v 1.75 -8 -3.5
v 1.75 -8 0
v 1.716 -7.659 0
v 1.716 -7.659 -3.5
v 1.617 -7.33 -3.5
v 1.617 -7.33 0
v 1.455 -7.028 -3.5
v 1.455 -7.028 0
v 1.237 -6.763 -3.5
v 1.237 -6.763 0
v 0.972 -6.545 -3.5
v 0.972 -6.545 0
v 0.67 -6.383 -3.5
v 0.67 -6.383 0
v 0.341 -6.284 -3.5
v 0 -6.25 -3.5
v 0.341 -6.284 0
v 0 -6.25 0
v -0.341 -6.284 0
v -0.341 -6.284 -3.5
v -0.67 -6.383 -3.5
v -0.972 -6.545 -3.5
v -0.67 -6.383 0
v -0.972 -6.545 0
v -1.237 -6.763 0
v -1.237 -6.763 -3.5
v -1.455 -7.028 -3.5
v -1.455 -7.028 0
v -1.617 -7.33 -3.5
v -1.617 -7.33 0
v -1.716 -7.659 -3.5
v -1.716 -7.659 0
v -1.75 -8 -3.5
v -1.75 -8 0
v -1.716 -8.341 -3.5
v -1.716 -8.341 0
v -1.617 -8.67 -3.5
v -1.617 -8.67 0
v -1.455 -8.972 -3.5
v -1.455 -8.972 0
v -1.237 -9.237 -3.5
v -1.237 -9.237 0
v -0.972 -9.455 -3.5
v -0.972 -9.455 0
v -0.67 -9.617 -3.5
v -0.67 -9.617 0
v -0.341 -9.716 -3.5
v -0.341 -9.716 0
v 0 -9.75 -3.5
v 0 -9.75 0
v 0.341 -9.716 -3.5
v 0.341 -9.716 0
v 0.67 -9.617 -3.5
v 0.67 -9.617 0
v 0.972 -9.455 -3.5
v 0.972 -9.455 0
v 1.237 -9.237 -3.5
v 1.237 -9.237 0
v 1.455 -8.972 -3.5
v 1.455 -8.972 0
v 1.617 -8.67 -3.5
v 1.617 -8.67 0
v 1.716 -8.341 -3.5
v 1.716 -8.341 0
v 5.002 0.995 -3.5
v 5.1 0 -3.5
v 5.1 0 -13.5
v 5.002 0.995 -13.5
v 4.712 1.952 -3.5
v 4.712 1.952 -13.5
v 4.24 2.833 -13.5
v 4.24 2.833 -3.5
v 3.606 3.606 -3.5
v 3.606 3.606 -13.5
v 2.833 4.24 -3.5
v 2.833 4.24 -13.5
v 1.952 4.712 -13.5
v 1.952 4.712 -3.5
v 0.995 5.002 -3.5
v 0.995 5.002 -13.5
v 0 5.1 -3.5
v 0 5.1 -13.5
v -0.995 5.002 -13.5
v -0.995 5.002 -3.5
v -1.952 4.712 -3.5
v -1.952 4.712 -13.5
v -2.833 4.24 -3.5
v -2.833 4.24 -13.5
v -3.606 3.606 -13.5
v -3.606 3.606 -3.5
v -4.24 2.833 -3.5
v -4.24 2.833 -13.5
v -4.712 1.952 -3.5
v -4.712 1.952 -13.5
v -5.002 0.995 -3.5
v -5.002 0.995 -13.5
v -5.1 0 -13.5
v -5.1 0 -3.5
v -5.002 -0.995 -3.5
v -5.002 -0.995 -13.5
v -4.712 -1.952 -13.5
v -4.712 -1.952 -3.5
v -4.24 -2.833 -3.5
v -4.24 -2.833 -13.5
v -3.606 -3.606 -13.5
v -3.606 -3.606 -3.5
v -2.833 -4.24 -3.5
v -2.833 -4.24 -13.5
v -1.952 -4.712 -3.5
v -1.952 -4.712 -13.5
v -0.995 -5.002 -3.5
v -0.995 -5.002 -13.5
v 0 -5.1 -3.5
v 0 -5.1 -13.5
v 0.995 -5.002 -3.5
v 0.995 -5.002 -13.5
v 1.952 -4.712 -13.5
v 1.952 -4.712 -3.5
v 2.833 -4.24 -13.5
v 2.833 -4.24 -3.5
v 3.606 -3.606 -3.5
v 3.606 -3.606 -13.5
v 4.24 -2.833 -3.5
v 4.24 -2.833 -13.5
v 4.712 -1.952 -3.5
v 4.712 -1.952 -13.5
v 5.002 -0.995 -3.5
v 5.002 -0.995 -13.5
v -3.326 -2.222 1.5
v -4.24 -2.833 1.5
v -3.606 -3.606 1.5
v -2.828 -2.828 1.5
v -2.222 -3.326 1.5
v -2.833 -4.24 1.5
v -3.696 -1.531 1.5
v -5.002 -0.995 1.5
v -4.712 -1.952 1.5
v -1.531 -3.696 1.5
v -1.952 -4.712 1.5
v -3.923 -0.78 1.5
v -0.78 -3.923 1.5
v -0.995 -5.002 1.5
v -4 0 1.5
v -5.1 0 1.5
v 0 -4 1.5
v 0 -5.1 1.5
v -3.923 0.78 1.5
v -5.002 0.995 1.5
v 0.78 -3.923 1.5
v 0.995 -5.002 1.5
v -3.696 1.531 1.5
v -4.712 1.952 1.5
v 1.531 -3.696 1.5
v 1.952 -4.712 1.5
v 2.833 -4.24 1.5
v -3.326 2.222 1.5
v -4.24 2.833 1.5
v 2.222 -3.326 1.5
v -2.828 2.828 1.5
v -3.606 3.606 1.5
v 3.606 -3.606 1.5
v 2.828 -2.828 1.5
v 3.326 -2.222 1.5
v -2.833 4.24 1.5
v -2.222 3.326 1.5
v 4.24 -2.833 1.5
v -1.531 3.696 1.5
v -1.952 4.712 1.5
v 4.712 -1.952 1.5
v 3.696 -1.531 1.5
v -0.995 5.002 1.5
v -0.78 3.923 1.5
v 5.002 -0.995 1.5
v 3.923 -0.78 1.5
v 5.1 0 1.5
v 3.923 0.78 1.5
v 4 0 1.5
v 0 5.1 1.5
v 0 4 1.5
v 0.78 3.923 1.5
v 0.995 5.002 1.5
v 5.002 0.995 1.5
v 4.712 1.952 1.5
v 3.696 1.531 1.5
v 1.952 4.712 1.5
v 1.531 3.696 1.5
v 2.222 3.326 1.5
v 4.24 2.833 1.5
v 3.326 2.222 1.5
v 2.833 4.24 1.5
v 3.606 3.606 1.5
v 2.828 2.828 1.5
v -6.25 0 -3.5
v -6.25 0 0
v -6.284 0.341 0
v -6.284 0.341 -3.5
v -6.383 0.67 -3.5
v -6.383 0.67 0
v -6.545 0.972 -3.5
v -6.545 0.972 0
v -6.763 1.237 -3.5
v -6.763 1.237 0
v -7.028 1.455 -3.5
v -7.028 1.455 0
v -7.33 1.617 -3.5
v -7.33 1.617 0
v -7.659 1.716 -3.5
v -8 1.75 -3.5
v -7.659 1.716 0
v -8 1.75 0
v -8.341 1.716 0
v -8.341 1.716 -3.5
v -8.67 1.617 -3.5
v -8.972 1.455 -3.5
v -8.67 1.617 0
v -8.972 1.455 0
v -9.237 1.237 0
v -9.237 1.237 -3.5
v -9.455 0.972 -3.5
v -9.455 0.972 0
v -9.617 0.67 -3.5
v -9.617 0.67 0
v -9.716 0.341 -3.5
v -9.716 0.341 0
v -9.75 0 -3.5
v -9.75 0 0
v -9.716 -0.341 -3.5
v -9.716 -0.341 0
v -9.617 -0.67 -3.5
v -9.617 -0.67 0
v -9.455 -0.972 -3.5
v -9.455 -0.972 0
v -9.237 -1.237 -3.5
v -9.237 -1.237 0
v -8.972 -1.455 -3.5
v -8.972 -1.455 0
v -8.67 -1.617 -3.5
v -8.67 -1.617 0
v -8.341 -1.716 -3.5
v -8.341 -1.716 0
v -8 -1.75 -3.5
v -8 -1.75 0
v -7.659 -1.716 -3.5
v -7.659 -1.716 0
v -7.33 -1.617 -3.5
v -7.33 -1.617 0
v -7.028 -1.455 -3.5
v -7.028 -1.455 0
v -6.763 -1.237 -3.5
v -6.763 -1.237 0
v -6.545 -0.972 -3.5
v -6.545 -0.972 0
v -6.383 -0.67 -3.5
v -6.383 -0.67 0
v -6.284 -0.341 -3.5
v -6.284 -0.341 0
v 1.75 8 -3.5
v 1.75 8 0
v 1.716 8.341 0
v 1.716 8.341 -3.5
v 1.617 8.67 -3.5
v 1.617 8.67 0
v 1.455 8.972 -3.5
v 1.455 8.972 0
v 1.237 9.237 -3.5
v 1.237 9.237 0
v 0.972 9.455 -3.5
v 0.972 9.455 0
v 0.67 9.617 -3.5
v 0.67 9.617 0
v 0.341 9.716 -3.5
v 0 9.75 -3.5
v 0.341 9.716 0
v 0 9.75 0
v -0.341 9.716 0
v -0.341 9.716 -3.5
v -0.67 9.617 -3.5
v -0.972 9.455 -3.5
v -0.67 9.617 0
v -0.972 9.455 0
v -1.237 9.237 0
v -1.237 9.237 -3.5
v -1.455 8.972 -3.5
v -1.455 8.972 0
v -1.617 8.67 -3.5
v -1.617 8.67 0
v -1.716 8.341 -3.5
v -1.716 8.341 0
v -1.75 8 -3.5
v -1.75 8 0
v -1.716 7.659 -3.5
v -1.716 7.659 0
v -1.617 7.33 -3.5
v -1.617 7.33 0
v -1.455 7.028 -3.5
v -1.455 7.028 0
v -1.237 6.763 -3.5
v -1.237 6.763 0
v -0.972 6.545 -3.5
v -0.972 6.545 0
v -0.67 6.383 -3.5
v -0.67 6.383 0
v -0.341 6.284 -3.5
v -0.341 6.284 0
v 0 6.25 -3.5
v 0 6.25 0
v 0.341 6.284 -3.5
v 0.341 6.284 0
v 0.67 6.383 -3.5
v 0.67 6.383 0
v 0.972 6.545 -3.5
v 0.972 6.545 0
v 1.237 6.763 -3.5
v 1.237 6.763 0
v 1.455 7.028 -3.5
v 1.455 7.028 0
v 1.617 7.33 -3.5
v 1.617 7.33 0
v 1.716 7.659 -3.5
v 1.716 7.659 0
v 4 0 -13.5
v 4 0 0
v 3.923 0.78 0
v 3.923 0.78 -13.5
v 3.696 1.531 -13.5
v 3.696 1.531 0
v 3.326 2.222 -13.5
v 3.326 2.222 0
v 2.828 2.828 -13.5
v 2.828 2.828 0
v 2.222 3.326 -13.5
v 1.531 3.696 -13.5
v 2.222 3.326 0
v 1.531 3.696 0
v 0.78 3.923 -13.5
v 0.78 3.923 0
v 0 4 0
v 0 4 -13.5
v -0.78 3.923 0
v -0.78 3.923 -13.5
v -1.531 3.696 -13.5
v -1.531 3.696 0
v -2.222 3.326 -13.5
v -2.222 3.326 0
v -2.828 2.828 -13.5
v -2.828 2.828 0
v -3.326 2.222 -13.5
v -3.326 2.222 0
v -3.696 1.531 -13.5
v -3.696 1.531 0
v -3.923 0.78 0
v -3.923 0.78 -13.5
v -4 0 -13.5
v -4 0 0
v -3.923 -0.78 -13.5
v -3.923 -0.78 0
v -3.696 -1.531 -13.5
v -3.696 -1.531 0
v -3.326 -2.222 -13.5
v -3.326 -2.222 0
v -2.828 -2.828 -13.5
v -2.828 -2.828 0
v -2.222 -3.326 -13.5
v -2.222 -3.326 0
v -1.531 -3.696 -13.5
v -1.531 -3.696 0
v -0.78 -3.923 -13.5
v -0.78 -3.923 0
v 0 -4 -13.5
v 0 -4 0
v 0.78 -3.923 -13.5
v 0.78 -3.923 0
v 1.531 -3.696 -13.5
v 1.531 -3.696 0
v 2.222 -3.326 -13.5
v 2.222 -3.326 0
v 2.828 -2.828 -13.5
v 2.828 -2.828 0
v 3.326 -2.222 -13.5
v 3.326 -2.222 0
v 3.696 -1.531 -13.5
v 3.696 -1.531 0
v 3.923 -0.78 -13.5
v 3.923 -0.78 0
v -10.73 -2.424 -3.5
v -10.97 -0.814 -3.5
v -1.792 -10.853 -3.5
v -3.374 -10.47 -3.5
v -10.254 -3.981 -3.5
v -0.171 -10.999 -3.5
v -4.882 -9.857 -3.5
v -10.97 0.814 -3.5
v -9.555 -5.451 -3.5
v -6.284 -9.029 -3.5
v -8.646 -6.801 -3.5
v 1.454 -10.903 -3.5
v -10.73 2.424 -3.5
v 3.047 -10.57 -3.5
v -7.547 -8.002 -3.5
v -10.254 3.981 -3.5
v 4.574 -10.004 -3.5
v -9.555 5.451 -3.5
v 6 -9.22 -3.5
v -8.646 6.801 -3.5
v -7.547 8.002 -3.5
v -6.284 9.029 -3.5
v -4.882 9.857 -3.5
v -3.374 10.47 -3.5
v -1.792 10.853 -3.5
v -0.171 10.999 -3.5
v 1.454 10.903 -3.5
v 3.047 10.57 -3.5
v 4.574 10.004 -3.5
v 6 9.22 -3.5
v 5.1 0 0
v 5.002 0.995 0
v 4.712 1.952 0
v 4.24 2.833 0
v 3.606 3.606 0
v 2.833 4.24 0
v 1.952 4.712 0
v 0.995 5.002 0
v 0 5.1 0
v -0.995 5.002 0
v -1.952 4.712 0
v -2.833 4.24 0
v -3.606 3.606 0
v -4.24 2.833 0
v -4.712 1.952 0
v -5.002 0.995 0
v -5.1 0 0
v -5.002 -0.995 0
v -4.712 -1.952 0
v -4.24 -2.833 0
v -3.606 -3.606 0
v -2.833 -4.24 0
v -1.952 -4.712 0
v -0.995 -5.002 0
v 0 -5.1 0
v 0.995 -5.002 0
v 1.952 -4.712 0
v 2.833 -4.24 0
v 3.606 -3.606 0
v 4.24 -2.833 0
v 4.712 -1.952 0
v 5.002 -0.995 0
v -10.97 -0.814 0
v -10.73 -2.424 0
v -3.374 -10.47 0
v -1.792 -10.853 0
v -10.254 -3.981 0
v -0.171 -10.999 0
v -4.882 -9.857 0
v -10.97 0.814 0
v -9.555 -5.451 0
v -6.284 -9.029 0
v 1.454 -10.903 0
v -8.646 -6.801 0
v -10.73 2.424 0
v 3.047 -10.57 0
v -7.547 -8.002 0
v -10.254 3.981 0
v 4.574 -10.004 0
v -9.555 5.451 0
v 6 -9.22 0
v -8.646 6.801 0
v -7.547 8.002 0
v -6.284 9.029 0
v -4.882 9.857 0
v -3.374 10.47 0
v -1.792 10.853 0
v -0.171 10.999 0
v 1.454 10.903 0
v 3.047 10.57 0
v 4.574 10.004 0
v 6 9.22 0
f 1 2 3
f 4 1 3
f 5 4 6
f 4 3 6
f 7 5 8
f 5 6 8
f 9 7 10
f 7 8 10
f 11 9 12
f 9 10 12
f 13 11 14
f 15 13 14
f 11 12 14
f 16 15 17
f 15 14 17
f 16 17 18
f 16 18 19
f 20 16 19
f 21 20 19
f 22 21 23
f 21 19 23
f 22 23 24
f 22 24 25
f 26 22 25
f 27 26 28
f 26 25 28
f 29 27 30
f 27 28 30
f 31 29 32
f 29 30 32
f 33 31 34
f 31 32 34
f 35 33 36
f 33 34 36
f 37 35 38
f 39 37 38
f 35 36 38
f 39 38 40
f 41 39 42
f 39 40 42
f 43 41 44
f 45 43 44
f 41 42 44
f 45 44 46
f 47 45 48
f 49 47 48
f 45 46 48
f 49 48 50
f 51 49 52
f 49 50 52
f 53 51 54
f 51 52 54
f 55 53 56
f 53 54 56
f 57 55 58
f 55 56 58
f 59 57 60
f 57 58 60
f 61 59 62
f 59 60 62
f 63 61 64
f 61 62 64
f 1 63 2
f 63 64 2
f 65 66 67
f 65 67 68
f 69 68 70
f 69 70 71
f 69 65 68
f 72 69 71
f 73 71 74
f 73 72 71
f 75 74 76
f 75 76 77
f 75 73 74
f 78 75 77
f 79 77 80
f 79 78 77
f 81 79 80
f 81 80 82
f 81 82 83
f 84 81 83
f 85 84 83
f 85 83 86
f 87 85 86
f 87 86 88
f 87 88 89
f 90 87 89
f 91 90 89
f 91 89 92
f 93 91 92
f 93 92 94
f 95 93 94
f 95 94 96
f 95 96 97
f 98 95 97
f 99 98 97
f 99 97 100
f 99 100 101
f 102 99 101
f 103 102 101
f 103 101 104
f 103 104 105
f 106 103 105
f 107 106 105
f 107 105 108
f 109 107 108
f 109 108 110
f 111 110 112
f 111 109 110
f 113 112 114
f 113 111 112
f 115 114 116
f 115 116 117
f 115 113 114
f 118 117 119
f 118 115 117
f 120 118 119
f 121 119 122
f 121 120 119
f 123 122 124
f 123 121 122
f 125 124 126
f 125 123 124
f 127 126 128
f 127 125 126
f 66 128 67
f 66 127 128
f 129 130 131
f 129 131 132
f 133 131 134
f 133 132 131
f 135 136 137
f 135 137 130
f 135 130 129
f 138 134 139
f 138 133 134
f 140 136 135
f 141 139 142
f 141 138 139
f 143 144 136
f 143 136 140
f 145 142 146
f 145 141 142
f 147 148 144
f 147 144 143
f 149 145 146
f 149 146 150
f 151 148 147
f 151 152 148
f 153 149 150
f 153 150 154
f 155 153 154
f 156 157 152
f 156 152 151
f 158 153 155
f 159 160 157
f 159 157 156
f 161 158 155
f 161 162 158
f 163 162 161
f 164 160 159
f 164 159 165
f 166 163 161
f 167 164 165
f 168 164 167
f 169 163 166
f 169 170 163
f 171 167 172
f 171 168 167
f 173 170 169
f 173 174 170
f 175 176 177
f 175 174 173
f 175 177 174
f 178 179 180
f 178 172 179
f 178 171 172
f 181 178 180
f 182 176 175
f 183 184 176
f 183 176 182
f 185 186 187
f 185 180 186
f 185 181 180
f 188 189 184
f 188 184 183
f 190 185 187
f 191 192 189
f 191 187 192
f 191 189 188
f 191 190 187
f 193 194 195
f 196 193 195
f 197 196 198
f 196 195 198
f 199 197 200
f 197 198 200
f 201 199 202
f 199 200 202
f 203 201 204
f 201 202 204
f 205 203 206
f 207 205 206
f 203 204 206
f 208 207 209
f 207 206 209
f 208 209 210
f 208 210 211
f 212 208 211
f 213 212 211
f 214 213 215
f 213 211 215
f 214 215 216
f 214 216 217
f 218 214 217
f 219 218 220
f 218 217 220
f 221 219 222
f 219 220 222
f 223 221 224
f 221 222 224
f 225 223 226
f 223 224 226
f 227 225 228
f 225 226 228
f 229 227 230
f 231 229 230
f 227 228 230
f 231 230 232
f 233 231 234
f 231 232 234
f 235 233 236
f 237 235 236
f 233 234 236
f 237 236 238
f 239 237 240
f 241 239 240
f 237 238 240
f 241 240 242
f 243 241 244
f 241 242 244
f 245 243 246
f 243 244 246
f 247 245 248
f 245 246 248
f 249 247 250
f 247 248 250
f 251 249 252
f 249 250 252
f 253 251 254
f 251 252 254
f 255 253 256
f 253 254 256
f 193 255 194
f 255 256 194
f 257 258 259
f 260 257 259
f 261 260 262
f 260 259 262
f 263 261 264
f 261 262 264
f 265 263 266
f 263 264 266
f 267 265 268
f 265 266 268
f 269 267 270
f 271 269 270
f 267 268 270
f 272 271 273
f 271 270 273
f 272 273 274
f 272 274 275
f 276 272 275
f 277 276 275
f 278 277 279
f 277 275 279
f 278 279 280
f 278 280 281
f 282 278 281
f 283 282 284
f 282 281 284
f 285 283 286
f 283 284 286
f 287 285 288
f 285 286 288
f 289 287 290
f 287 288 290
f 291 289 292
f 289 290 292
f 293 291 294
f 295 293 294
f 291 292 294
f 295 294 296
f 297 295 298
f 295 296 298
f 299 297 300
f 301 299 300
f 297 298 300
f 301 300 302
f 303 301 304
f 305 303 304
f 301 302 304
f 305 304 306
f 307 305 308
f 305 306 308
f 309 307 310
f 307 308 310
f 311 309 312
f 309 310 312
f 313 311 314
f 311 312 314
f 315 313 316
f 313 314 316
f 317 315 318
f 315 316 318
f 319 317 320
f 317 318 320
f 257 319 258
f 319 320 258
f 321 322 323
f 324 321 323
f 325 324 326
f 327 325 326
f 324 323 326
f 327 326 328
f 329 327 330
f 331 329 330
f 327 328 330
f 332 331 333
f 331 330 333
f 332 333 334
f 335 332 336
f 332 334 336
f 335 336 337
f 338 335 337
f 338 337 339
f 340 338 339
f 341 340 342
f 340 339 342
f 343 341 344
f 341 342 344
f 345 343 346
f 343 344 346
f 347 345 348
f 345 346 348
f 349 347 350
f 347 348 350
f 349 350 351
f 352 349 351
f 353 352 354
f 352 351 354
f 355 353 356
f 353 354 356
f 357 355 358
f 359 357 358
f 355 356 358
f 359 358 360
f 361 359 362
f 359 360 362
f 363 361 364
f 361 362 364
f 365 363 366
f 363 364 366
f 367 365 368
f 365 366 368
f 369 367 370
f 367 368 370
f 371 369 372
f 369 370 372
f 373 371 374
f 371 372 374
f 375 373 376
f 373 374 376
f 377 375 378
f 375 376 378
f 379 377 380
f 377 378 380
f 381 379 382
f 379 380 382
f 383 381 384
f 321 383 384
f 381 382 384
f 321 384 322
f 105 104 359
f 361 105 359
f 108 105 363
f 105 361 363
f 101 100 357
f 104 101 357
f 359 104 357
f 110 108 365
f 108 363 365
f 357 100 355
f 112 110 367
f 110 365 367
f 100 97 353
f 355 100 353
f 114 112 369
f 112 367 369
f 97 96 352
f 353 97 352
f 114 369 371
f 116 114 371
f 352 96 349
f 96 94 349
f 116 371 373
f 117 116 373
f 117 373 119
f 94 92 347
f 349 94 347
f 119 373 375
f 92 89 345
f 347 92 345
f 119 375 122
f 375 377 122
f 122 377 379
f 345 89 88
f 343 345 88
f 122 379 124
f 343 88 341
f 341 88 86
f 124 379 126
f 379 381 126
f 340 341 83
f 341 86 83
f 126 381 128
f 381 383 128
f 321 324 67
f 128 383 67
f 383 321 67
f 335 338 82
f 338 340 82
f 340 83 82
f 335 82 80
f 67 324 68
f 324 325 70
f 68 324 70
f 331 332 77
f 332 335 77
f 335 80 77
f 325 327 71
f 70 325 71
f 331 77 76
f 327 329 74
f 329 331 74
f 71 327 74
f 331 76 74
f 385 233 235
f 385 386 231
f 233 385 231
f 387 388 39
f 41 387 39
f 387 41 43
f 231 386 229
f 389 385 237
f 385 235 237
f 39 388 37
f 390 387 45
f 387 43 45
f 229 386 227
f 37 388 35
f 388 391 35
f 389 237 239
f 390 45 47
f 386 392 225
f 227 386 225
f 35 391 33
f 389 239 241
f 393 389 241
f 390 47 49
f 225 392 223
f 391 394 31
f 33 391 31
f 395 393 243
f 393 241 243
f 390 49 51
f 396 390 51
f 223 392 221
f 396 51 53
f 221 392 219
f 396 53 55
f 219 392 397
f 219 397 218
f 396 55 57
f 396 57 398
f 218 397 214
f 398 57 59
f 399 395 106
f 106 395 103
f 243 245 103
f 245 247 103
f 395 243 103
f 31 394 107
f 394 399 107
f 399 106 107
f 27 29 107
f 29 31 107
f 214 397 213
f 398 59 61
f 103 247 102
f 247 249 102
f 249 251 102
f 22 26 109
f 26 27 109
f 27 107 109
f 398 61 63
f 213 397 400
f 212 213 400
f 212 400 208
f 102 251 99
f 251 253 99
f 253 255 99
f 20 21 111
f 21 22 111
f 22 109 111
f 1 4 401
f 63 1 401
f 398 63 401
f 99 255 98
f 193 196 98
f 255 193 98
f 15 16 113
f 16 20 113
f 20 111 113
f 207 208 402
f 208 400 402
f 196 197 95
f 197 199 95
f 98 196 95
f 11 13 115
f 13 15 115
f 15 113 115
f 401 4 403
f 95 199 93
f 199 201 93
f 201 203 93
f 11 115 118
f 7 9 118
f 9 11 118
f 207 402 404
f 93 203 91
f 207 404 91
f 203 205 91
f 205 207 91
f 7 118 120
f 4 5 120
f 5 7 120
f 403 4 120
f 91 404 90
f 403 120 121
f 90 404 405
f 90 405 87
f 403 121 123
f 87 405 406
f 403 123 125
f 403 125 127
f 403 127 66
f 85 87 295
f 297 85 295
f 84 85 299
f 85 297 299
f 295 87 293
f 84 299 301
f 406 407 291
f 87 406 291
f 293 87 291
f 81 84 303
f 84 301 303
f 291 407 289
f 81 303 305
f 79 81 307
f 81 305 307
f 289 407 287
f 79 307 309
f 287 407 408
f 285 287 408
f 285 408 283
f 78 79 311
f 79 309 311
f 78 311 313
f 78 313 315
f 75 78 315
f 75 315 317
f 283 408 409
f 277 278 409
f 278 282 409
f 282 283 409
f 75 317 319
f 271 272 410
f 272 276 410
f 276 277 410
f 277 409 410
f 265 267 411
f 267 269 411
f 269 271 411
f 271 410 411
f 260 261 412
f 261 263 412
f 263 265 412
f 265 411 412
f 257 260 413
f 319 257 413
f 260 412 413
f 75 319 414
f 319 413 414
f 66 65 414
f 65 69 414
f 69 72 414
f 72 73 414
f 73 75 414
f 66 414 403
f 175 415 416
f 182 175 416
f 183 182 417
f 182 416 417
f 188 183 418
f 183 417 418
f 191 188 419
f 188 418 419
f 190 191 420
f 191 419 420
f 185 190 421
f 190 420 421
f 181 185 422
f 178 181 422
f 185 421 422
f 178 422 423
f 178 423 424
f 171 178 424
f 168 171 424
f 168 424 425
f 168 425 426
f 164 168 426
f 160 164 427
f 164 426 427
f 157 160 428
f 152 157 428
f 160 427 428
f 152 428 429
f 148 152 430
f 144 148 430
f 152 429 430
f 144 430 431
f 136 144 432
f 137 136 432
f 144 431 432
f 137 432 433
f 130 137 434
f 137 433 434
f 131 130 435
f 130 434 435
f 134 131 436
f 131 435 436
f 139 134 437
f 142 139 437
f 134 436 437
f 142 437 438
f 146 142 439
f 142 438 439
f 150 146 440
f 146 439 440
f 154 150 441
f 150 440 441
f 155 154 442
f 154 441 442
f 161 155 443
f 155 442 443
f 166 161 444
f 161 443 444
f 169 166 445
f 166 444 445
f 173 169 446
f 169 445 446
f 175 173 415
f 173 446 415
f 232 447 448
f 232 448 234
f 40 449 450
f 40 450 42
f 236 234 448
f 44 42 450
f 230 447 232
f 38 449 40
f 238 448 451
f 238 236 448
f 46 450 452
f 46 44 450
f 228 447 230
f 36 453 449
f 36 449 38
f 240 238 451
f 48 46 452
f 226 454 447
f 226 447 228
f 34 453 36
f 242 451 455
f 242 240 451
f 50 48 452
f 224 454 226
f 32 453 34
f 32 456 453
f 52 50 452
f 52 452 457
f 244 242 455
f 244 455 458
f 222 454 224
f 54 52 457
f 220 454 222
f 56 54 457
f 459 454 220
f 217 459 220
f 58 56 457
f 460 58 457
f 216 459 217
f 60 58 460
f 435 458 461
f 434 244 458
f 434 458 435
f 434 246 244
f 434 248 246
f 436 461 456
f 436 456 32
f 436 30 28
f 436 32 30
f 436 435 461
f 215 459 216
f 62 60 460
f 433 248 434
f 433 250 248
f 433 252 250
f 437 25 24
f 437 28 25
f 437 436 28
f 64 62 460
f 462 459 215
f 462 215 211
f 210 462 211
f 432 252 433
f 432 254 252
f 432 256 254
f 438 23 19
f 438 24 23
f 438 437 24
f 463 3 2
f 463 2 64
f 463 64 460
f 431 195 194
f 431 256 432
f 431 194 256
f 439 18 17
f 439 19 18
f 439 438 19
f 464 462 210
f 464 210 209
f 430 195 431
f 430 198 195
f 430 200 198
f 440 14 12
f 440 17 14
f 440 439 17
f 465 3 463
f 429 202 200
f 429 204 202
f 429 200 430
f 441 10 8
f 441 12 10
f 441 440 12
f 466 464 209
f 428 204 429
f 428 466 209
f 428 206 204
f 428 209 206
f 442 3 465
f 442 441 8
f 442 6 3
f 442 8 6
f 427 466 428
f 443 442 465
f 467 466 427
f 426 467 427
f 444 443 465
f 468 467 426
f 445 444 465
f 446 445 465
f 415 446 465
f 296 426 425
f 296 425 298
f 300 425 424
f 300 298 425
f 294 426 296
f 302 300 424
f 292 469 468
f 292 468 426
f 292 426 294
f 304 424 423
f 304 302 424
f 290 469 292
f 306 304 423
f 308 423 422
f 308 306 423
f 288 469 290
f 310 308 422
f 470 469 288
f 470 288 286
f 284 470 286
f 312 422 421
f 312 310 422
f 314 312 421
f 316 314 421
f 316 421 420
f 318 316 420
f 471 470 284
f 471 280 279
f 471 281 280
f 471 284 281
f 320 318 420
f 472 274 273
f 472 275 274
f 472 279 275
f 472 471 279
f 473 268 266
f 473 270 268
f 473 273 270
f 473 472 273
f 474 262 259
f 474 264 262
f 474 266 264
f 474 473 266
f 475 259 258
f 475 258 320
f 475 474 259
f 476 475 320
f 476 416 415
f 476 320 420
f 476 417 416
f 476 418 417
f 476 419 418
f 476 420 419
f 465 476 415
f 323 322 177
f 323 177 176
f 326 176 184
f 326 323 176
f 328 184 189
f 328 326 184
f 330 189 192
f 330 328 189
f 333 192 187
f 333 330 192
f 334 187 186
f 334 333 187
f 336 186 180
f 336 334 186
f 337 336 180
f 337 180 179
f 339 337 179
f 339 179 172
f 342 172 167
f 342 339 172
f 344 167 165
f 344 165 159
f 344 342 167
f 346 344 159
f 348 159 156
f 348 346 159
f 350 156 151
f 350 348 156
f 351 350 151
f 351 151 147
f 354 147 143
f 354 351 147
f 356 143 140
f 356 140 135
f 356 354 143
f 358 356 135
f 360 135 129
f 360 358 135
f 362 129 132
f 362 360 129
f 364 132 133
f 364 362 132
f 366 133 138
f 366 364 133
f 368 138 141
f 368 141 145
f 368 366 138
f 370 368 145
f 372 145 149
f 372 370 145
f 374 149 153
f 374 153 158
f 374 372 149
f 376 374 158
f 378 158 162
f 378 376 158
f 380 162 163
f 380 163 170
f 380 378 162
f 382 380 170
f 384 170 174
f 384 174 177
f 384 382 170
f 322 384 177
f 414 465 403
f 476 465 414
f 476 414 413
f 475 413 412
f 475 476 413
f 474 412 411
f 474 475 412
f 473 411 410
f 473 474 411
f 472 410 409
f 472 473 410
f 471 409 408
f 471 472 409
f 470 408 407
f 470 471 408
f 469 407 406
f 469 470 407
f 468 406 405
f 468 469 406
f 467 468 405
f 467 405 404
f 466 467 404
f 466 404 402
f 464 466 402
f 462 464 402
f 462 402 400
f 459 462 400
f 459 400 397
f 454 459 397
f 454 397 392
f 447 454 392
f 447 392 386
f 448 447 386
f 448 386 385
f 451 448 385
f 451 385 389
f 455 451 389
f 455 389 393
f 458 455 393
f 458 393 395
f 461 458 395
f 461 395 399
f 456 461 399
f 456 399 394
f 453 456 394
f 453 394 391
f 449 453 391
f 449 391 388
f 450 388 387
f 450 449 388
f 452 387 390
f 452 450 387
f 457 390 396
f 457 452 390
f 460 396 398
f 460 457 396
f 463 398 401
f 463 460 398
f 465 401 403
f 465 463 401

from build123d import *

# Parameters (mm, degrees)
SKETCH1_R                = 11
SKETCH1_R_2              = 5.1
SKETCH1_R_3              = 1.75
BOSS_EXTRUDE1_DEPTH      = 3.5
BOSS_EXTRUDE2_DEPTH      = 1.5
BOSS_EXTRUDE2_DEPTH_BACK = 13.5
SKETCH2_R                = 5.1
SKETCH2_R_2              = 4
CROQUIS1_W               = 13.137854129
CROQUIS1_H               = 23.868248077
CORTAR_EXTRUIR1_DEPTH    = 21.597329924


with BuildPart() as part:
    # Sketch1 → Boss-Extrude1 (new body)
    with BuildSketch(Plane.XY):
        Circle(SKETCH1_R)
        Circle(SKETCH1_R_2, mode=Mode.SUBTRACT)
        with Locations((0, 8)):
            Circle(SKETCH1_R_3, mode=Mode.SUBTRACT)
        with Locations((8, 0)):
            Circle(SKETCH1_R_3, mode=Mode.SUBTRACT)
        with Locations((0, -8)):
            Circle(SKETCH1_R_3, mode=Mode.SUBTRACT)
        with Locations((-8, 0)):
            Circle(SKETCH1_R_3, mode=Mode.SUBTRACT)
    extrude(amount=-BOSS_EXTRUDE1_DEPTH)

    # Sketch2 → Boss-Extrude2 (add, two sides: drawn at the far end of the back side and taken through both)
    with BuildSketch(Plane.XY.offset(-BOSS_EXTRUDE2_DEPTH_BACK)):
        Circle(SKETCH2_R)
        Circle(SKETCH2_R_2, mode=Mode.SUBTRACT)
    extrude(amount=BOSS_EXTRUDE2_DEPTH + BOSS_EXTRUDE2_DEPTH_BACK)

    # Croquis1 → Cortar-Extruir1 (cut, through all)
    with BuildSketch(Plane.XY):
        with Locations((12.568927065, 0.450129168)):
            Rectangle(CROQUIS1_W, CROQUIS1_H)
    extrude(amount=-CORTAR_EXTRUIR1_DEPTH, mode=Mode.SUBTRACT)


solid = part.part
